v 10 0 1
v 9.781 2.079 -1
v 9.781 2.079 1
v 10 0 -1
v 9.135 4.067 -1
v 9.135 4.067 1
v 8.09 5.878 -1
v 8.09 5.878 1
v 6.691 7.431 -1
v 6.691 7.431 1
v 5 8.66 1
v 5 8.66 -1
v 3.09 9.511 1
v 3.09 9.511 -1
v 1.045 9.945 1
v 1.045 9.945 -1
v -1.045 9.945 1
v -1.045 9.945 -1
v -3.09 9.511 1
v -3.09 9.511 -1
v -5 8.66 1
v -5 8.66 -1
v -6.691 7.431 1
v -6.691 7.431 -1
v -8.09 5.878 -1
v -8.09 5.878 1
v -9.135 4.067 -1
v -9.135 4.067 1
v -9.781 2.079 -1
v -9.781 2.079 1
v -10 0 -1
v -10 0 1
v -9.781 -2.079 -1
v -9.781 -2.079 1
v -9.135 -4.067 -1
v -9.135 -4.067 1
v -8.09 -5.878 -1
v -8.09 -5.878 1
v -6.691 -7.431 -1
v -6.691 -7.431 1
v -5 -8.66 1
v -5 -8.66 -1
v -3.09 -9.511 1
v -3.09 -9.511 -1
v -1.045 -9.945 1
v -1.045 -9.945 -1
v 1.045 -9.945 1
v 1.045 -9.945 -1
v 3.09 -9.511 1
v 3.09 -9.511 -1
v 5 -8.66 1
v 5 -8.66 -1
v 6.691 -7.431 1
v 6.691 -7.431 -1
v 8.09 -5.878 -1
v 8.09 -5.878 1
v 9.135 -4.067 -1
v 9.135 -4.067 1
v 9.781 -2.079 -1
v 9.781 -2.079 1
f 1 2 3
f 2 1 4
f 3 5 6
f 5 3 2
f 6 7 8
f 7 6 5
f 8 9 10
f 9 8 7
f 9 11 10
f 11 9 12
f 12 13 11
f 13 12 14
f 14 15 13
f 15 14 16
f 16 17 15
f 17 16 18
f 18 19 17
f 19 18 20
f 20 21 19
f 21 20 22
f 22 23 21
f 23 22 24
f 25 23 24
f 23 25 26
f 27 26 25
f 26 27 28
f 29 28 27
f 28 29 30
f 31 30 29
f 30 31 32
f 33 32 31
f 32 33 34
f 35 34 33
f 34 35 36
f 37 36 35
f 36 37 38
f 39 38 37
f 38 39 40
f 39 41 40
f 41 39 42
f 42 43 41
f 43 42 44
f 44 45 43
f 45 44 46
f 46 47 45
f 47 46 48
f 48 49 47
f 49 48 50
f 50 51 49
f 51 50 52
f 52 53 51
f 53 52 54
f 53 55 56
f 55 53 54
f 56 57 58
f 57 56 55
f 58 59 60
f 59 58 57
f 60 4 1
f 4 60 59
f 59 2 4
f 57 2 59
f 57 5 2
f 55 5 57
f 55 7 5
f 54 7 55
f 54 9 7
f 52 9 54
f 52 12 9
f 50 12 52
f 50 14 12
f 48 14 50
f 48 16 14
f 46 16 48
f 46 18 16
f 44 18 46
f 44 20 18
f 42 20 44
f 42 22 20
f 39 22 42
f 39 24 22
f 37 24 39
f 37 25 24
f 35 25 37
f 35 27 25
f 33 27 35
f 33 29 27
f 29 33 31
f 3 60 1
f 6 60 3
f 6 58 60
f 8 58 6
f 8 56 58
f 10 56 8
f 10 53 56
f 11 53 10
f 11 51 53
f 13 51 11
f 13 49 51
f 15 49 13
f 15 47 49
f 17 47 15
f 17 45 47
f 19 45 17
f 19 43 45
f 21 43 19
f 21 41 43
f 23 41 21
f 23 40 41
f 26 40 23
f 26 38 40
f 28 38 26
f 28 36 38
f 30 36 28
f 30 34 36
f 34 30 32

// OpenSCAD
// Placeholder starter.scad for Accessibility Audit
// Generated to satisfy book links; replace with actual starter when available.

// Simple tactile marker example
cylinder(h=2, r=10, center=true);
